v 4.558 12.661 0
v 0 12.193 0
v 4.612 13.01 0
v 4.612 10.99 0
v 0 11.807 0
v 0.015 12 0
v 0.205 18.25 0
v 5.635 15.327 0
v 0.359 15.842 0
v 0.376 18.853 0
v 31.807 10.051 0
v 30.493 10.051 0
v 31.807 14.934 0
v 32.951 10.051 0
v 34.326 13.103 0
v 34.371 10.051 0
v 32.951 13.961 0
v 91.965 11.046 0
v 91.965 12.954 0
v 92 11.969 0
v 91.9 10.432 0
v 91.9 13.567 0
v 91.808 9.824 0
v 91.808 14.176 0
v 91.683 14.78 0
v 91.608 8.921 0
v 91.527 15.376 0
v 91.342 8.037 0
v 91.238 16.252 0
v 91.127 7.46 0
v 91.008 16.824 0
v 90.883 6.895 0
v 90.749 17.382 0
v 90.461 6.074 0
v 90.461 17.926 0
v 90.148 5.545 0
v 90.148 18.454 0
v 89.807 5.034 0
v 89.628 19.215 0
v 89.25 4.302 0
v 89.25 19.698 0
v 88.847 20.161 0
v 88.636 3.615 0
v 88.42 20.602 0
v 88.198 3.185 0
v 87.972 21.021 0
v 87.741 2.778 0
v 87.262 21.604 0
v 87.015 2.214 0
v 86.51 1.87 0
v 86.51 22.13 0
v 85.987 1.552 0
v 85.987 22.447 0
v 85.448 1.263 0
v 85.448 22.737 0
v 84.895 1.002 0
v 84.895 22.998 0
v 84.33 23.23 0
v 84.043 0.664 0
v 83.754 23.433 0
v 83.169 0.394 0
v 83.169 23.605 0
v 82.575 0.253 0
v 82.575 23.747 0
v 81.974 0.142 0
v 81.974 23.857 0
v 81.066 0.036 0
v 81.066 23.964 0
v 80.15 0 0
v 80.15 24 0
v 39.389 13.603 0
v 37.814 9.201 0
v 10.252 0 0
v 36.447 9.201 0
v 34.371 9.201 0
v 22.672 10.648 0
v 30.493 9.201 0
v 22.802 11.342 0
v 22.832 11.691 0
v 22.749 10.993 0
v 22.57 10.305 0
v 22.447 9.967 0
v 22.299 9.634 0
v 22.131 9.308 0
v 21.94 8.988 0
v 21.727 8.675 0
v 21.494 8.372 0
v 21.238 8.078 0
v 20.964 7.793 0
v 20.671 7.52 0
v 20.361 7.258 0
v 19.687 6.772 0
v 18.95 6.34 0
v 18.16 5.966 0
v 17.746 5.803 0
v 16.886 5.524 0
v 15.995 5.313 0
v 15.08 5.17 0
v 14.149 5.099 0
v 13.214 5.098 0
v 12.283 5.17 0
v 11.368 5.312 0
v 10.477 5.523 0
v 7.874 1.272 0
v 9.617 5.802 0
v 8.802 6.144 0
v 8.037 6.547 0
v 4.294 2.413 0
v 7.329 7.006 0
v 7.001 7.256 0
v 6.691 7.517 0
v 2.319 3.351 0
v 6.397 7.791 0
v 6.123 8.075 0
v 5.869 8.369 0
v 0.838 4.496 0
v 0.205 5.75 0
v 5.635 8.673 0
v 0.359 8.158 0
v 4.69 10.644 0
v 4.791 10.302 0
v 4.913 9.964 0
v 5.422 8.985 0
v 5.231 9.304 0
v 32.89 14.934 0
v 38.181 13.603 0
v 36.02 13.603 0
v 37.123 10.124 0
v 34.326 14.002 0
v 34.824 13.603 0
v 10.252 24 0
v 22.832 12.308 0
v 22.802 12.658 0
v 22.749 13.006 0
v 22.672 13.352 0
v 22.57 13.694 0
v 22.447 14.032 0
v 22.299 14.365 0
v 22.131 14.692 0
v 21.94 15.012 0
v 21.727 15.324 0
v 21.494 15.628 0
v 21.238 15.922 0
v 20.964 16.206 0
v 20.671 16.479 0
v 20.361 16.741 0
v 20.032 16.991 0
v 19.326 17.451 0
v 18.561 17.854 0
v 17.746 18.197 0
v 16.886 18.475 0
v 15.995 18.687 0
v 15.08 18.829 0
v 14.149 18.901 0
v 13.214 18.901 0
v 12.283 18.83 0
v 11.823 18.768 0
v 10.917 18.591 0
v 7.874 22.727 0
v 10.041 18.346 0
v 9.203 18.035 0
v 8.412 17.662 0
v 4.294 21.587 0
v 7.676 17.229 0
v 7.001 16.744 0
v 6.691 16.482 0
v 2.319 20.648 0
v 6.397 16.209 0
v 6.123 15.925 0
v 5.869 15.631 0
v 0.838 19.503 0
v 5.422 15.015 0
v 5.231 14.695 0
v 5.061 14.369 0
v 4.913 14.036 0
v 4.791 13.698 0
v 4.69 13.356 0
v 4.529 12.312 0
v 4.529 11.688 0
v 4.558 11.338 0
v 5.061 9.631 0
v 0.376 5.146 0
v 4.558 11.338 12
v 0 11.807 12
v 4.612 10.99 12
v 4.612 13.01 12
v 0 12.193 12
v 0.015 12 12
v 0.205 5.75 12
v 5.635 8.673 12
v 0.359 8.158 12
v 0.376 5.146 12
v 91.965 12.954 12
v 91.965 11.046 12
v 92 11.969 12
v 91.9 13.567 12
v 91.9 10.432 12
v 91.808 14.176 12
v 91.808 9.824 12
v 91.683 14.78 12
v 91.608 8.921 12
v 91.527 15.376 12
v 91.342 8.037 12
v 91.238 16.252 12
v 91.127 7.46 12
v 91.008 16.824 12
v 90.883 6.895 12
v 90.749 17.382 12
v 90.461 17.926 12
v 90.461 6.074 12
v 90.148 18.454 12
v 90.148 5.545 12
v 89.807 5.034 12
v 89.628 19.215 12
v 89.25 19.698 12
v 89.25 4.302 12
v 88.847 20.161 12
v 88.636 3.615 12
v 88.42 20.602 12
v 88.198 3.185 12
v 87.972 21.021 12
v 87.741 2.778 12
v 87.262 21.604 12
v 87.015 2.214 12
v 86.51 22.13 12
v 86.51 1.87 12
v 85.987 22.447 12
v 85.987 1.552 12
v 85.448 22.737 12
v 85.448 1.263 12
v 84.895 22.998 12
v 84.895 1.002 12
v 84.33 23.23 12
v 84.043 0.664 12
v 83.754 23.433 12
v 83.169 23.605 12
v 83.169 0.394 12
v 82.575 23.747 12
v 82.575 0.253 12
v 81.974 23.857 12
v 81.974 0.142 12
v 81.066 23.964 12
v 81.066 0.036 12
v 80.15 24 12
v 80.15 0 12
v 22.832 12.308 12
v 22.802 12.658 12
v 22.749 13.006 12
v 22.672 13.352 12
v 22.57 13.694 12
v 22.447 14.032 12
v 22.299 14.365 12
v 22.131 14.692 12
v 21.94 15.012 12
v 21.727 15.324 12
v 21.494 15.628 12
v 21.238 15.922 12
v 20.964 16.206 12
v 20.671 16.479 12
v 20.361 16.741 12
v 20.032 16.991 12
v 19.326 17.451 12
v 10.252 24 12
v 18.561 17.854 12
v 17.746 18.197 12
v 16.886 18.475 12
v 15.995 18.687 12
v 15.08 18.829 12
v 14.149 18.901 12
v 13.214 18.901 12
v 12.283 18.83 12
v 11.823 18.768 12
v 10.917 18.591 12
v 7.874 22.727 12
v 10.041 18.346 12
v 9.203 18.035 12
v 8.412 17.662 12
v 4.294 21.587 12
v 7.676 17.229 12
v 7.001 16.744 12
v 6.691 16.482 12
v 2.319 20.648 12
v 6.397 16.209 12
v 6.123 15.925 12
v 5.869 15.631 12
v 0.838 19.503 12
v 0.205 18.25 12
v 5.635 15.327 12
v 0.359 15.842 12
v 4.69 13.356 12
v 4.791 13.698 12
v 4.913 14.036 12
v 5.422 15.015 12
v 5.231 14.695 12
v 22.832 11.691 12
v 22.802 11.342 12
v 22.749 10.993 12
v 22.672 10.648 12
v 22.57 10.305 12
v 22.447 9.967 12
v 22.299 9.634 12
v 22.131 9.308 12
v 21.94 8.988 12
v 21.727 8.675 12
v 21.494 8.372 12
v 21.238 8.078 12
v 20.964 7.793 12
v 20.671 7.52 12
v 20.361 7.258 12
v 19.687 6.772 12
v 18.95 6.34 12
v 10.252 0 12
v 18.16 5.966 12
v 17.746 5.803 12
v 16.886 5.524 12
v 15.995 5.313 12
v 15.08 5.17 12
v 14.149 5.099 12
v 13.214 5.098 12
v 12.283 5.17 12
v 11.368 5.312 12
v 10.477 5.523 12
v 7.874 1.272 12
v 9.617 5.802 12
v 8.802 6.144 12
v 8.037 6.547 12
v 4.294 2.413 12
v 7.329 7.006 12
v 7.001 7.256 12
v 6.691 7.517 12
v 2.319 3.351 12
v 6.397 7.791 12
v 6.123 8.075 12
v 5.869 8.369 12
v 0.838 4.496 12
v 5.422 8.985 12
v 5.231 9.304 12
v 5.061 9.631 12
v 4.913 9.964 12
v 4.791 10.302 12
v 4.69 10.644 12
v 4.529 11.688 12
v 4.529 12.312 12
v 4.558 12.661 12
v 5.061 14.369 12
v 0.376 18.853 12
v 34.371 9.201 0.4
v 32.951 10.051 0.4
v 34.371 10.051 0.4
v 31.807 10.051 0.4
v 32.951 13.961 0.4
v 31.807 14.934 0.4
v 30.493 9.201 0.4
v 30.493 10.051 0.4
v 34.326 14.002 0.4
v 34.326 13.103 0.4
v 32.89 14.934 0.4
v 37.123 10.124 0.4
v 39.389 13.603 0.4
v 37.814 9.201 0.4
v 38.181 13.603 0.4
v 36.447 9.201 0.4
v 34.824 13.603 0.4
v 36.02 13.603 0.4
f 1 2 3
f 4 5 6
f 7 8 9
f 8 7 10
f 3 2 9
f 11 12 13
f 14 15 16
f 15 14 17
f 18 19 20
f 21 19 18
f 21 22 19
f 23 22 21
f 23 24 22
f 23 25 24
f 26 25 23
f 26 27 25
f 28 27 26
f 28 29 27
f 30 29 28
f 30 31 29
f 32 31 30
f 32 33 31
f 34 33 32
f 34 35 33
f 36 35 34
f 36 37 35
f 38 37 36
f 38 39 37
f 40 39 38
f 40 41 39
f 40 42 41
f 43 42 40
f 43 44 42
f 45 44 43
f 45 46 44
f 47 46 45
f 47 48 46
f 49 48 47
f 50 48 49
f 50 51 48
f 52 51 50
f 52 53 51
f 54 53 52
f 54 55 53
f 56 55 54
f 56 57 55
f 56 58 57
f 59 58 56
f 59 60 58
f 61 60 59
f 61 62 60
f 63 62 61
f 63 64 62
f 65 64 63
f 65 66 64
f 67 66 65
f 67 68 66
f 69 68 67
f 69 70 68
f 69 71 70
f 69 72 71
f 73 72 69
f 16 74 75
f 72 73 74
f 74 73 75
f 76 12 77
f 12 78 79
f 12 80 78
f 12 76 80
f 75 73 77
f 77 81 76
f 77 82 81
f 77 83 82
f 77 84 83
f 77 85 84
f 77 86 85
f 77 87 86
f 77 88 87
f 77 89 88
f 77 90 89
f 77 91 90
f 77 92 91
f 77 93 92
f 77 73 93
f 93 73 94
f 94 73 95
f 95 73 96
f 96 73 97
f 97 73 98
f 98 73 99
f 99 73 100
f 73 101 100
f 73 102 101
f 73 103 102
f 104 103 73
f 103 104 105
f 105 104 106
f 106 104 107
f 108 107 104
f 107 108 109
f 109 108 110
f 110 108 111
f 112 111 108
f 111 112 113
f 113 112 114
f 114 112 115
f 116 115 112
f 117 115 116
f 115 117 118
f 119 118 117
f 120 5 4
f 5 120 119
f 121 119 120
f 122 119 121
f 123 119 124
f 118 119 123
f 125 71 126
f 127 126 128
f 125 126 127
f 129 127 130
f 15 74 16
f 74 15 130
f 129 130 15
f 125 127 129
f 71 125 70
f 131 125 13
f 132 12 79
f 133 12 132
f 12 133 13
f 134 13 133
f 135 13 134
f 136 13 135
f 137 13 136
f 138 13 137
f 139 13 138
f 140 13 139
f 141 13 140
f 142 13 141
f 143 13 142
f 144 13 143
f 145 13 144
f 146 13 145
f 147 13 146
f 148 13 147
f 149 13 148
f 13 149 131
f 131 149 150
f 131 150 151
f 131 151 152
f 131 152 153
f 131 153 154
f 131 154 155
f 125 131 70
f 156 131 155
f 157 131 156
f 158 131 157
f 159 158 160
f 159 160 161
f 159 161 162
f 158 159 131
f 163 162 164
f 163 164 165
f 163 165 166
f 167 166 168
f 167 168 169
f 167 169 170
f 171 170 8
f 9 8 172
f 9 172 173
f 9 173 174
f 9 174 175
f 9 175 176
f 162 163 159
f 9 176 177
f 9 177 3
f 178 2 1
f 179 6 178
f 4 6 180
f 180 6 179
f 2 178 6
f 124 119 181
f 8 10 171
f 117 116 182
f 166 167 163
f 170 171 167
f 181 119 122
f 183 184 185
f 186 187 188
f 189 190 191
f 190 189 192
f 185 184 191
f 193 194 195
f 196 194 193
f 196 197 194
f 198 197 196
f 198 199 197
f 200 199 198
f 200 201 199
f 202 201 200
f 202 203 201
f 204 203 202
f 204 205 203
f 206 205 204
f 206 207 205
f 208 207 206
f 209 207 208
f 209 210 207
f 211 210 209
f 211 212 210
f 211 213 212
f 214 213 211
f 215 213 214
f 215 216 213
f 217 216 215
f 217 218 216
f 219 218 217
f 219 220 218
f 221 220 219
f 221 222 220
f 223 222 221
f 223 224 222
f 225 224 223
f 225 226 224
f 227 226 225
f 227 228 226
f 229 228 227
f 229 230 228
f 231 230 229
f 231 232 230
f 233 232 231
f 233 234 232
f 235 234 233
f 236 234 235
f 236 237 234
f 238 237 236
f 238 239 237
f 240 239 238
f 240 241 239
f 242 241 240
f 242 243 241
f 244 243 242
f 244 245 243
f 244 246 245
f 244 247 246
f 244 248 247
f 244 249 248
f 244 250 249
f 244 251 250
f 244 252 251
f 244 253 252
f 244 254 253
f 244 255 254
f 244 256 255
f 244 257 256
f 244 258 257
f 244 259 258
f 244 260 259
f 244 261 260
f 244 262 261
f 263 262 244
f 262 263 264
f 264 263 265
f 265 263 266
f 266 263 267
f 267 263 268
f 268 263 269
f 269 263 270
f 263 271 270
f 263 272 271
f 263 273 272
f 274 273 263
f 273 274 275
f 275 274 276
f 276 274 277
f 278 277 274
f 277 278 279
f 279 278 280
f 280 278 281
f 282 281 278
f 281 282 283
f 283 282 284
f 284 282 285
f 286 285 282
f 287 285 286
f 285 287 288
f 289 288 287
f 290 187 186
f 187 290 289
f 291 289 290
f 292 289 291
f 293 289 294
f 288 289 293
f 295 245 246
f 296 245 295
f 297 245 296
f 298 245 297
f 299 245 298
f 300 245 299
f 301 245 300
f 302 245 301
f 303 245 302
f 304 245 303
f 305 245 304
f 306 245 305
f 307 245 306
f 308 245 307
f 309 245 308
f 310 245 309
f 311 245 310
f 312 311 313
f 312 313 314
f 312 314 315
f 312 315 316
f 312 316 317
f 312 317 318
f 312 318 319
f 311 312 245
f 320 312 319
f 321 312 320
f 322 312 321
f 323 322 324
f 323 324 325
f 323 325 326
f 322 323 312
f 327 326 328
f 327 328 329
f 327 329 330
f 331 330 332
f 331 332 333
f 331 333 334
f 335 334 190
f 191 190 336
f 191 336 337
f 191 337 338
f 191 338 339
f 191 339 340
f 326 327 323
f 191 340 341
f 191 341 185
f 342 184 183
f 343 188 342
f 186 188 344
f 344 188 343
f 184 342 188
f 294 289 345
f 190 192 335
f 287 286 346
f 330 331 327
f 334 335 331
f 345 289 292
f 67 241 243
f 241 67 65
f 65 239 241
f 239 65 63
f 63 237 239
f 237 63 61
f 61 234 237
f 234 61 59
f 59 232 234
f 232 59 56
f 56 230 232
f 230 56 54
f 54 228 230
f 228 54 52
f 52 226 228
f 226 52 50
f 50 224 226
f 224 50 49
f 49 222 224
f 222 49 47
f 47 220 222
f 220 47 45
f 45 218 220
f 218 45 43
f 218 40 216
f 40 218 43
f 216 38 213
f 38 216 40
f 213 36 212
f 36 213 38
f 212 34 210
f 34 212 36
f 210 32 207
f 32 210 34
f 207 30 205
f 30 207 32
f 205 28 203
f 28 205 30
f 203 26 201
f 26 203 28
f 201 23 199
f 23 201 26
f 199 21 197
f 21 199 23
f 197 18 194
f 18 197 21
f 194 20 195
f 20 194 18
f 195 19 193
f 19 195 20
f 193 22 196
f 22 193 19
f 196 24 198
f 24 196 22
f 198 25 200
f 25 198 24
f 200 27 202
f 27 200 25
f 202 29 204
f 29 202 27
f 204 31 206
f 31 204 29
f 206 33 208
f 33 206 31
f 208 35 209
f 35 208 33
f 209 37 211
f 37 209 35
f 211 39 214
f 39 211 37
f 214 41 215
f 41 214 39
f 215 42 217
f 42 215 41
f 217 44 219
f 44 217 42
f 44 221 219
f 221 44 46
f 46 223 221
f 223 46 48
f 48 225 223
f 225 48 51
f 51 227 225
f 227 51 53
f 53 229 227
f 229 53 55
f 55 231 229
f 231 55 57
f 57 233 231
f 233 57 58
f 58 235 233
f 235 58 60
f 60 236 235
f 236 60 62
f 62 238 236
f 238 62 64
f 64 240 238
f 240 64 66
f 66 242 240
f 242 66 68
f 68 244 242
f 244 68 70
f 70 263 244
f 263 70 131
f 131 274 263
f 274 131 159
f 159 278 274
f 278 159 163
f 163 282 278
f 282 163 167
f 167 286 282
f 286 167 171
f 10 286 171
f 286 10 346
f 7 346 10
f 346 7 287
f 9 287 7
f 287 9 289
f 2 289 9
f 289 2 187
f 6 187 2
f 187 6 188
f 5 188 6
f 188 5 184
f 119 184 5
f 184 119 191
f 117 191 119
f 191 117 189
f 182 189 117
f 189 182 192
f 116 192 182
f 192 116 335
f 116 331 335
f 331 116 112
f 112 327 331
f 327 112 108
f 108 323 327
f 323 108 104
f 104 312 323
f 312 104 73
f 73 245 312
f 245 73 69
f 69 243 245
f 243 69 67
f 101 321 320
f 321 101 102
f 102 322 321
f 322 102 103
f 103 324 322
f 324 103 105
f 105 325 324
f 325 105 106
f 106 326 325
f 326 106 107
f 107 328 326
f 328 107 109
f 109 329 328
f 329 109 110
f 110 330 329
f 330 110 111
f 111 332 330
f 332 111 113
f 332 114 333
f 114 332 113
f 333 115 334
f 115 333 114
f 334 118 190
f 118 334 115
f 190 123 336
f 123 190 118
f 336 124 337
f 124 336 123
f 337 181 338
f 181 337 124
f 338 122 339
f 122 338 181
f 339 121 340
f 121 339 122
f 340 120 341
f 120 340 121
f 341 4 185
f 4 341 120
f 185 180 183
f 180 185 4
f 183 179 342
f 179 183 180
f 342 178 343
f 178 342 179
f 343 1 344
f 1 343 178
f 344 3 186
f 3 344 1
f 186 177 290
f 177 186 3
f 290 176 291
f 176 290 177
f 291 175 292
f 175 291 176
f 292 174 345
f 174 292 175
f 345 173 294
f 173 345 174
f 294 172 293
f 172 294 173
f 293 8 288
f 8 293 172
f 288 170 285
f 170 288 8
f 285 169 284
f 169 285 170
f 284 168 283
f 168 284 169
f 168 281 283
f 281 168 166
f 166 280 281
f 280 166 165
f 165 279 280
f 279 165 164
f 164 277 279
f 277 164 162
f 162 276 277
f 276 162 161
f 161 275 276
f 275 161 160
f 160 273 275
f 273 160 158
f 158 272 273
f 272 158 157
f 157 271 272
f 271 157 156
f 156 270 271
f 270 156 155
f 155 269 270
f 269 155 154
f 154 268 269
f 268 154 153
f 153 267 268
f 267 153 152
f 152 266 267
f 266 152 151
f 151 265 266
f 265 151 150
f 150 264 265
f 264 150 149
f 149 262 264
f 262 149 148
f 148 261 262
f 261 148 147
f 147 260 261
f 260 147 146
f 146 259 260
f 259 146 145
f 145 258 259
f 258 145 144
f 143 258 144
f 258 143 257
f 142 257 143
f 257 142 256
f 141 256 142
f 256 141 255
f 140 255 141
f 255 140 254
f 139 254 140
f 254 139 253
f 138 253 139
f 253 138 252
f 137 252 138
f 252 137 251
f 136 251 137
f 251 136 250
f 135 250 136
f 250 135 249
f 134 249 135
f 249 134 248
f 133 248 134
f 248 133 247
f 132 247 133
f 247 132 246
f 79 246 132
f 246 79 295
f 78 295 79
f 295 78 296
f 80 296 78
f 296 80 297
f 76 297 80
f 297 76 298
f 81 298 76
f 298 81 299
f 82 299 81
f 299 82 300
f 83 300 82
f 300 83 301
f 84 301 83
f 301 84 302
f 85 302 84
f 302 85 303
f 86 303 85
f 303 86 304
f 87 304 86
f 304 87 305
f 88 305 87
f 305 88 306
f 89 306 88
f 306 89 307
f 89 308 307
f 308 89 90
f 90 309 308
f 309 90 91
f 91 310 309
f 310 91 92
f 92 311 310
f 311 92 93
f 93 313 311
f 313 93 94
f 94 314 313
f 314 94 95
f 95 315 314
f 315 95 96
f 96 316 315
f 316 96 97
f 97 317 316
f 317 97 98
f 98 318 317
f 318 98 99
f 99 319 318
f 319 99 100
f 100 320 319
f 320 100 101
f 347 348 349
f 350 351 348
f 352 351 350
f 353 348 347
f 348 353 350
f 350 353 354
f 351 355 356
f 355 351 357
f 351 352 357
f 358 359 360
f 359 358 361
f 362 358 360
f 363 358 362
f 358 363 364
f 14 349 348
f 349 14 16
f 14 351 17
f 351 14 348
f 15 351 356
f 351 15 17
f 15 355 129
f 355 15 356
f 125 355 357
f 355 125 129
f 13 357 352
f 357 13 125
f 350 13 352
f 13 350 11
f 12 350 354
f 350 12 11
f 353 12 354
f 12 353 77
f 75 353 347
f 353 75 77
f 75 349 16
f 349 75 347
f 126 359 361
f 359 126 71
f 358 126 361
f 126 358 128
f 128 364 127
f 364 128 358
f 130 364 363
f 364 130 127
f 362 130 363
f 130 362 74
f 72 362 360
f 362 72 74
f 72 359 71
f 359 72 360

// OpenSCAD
// test — generated by protobot from a sketch (input.jpg)
// 2026-11-04
//
// Print: Prusa Core One, 0.4 mm nozzle, PLA, 0.2 mm layers, flat on the bed.
// The outline is stored in a 0..1 unit box and scaled by LENGTH/WIDTH, so
// the three measurements below are all you need to change. Re-export with:
//   openscad --backend=manifold --export-format binstl -o test.stl test.scad
//
// Dimension tags: [M] = given by the user, [S] = traced from the sketch.

/* [Measurements] */
LENGTH    = 92;   // [M] X extent, mm
WIDTH     = 24;   // [M] Y extent, mm
THICKNESS = 12;   // [M] extrusion height, mm

/* [Edge finish] */
// Perimeter edges (outline AND holes), top and bottom faces.
// "fillet" = rounded, "chamfer" = 45°, "none" = sharp. Built in LAYER steps,
// i.e. exactly as the printer will lay it down.
EDGE_TOP_KIND    = "none";
EDGE_TOP         = 0;     // mm
EDGE_BOTTOM_KIND = "none";
EDGE_BOTTOM      = 0;     // mm
LAYER            = 0.2;   // mm, print layer height

/* [Version stamp] */
VERSION        = 1;       // bump every revision
VERSION_POS    = [0.3793, 0.5000];  // [S] unit-box spot deepest inside the shape
VERSION_SIZE   = 6;      // mm text height
VERSION_DEPTH  = 0.4;    // mm, 2 layers at 0.2

/* [Screws and nuts] */
// One entry per screw hole: [x, y] in the unit box (scaled by LENGTH/WIDTH),
// then its cuts: ["circle", Ø] = screw-head recess, ["hex", across flats] =
// nut pocket, each [.., depth mm, "top"|"bottom"]. The clearance hole itself
// is part of the outline below.
FASTENERS = [];

/* [Hidden] */
// [S] traced outline (+ holes), unit box, y up.
OUTLINE_PTS = [
    [1.00000,0.49873], [0.99962,0.46024], [0.99893,0.43469], [0.99791,0.40932], [0.99575,0.37172], [0.99285,0.33487],
    [0.99051,0.31084], [0.98786,0.28731], [0.98329,0.25308], [0.97988,0.23106], [0.97618,0.20975], [0.97011,0.17925],
    [0.96344,0.15064], [0.95869,0.13272], [0.95371,0.11576], [0.94583,0.09225], [0.94033,0.07791], [0.93465,0.06469],
    [0.92879,0.05262], [0.92279,0.04174], [0.91352,0.02768], [0.90401,0.01644], [0.89756,0.01055], [0.89103,0.00594],
    [0.88115,0.00149], [0.87121,0.00000], [0.11145,0.00000], [0.08560,0.05301], [0.04668,0.10055], [0.02521,0.13964],
    [0.00911,0.18735], [0.00410,0.21444], [0.00223,0.23959], [0.00391,0.33992], [0.00000,0.49196], [0.00018,0.50000],
    [0.00000,0.50804], [0.00391,0.66008], [0.00223,0.76041], [0.00410,0.78556], [0.00911,0.81265], [0.02521,0.86036],
    [0.04668,0.89945], [0.08560,0.94699], [0.11145,1.00000], [0.87121,1.00000], [0.88115,0.99851], [0.89103,0.99406],
    [0.89756,0.98945], [0.90401,0.98356], [0.91038,0.97638], [0.91664,0.96794], [0.92279,0.95826], [0.92879,0.94738],
    [0.93465,0.93531], [0.94033,0.92209], [0.94851,0.90017], [0.95623,0.87588], [0.96110,0.85844], [0.96573,0.84004],
    [0.97011,0.82075], [0.97422,0.80062], [0.97988,0.76894], [0.98329,0.74692], [0.98641,0.72425], [0.98922,0.70099],
    [0.99172,0.67720], [0.99487,0.64066], [0.99656,0.61582], [0.99791,0.59068], [0.99893,0.56531], [0.99962,0.53976],
    [0.04923,0.48700], [0.04956,0.47243], [0.05014,0.45792], [0.05098,0.44351], [0.05208,0.42925], [0.05342,0.41517],
    [0.05502,0.40130], [0.05686,0.38769], [0.05894,0.37436], [0.06126,0.36136], [0.06380,0.34871], [0.06656,0.33645],
    [0.06954,0.32462], [0.07273,0.31323], [0.07611,0.30233], [0.07968,0.29194], [0.08736,0.27280], [0.09568,0.25600],
    [0.10455,0.24173], [0.11388,0.23013], [0.12357,0.22133], [0.13352,0.21541], [0.14364,0.21244], [0.15380,0.21245],
    [0.16392,0.21543], [0.17387,0.22136], [0.18356,0.23018], [0.19289,0.24179], [0.19739,0.24861], [0.20599,0.26417],
    [0.21400,0.28218], [0.22132,0.30243], [0.22470,0.31334], [0.22789,0.32473], [0.23086,0.33657], [0.23363,0.34883],
    [0.23617,0.36148], [0.23848,0.37449], [0.24056,0.38782], [0.24240,0.40144], [0.24400,0.41530], [0.24534,0.42939],
    [0.24644,0.44365], [0.24728,0.45806], [0.24786,0.47257], [0.24818,0.48714], [0.24818,0.51286], [0.24786,0.52743],
    [0.24728,0.54194], [0.24644,0.55635], [0.24534,0.57061], [0.24400,0.58470], [0.24240,0.59856], [0.24056,0.61218],
    [0.23848,0.62551], [0.23617,0.63852], [0.23363,0.65117], [0.23086,0.66343], [0.22789,0.67527], [0.22470,0.68666],
    [0.22132,0.69757], [0.21775,0.70796], [0.21007,0.72712], [0.20176,0.74392], [0.19289,0.75821], [0.18356,0.76982],
    [0.17387,0.77864], [0.16392,0.78457], [0.15380,0.78755], [0.14364,0.78756], [0.13352,0.78459], [0.12852,0.78200],
    [0.11868,0.77463], [0.10916,0.76441], [0.10005,0.75146], [0.09144,0.73591], [0.08344,0.71791], [0.07611,0.69767],
    [0.07273,0.68677], [0.06954,0.67538], [0.06656,0.66355], [0.06380,0.65129], [0.06126,0.63864], [0.05894,0.62564],
    [0.05686,0.61231], [0.05502,0.59870], [0.05342,0.58483], [0.05208,0.57075], [0.05098,0.55649], [0.05014,0.54208],
    [0.04956,0.52757], [0.04923,0.51300]
];
OUTLINE_PATHS = [
    [for (i = [0:71]) i],
    [for (i = [72:163]) i]
];

module outline_2d() {
    scale([LENGTH, WIDTH]) polygon(points = OUTLINE_PTS, paths = OUTLINE_PATHS);
}

// Debossed into the bottom face, mirrored so it reads from underneath.
module version_stamp() {
    if (!is_undef(VERSION_POS) && VERSION_SIZE > 0)
        translate([VERSION_POS[0] * LENGTH, VERSION_POS[1] * WIDTH, -0.01])
            linear_extrude(VERSION_DEPTH + 0.01)
                mirror([1, 0])
                    text(str("v", VERSION), size = VERSION_SIZE,
                         font = "Liberation Sans:style=Bold",
                         halign = "center", valign = "center");
}

// Screw-head recesses and nut pockets, cut into the top or bottom face.
module fastener_cuts() {
    for (f = FASTENERS) for (c = f[1])
        translate([f[0][0] * LENGTH, f[0][1] * WIDTH,
                   c[3] == "top" ? THICKNESS - c[2] : -0.01])
            linear_extrude(c[2] + 0.01 + (c[3] == "top" ? 0.01 : 0))
                if (c[0] == "hex") circle(d = c[1] / cos(30), $fn = 6);
                else circle(d = c[1]);
}

// How far the outline is pulled in at depth d (0..r) into a finished edge.
function edge_inset(kind, r, d) =
    kind == "chamfer" ? max(0, r - d) :
    kind == "fillet"  ? r - sqrt(max(0, r * r - (r - min(d, r)) * (r - min(d, r)))) : 0;

module body() {
    nb = EDGE_BOTTOM_KIND == "none" ? 0 : ceil(EDGE_BOTTOM / LAYER - 1e-6);
    nt = EDGE_TOP_KIND    == "none" ? 0 : ceil(EDGE_TOP / LAYER - 1e-6);
    zb = nb * LAYER;
    zt = nt * LAYER;
    union() {
        // straight-walled core, overlapping the finished layers (no shared faces)
        translate([0, 0, zb - (nb > 0 ? 0.01 : 0)])
            linear_extrude(THICKNESS - zb - zt + (nb > 0 ? 0.01 : 0) + (nt > 0 ? 0.01 : 0))
                outline_2d();
        if (nb > 0) for (i = [0 : nb - 1])
            translate([0, 0, i * LAYER])
                linear_extrude(LAYER + 0.01)
                    offset(delta = -edge_inset(EDGE_BOTTOM_KIND, EDGE_BOTTOM, (i + 0.5) * LAYER))
                        outline_2d();
        if (nt > 0) for (i = [0 : nt - 1])
            translate([0, 0, THICKNESS - (i + 1) * LAYER - (i < nt - 1 ? 0.01 : 0)])
                linear_extrude(LAYER + (i < nt - 1 ? 0.01 : 0))
                    offset(delta = -edge_inset(EDGE_TOP_KIND, EDGE_TOP, (i + 0.5) * LAYER))
                        outline_2d();
    }
}

module part() {
    $fa = 2; $fs = 0.4;
    difference() {
        body();
        version_stamp();
        fastener_cuts();
    }
}

part();
